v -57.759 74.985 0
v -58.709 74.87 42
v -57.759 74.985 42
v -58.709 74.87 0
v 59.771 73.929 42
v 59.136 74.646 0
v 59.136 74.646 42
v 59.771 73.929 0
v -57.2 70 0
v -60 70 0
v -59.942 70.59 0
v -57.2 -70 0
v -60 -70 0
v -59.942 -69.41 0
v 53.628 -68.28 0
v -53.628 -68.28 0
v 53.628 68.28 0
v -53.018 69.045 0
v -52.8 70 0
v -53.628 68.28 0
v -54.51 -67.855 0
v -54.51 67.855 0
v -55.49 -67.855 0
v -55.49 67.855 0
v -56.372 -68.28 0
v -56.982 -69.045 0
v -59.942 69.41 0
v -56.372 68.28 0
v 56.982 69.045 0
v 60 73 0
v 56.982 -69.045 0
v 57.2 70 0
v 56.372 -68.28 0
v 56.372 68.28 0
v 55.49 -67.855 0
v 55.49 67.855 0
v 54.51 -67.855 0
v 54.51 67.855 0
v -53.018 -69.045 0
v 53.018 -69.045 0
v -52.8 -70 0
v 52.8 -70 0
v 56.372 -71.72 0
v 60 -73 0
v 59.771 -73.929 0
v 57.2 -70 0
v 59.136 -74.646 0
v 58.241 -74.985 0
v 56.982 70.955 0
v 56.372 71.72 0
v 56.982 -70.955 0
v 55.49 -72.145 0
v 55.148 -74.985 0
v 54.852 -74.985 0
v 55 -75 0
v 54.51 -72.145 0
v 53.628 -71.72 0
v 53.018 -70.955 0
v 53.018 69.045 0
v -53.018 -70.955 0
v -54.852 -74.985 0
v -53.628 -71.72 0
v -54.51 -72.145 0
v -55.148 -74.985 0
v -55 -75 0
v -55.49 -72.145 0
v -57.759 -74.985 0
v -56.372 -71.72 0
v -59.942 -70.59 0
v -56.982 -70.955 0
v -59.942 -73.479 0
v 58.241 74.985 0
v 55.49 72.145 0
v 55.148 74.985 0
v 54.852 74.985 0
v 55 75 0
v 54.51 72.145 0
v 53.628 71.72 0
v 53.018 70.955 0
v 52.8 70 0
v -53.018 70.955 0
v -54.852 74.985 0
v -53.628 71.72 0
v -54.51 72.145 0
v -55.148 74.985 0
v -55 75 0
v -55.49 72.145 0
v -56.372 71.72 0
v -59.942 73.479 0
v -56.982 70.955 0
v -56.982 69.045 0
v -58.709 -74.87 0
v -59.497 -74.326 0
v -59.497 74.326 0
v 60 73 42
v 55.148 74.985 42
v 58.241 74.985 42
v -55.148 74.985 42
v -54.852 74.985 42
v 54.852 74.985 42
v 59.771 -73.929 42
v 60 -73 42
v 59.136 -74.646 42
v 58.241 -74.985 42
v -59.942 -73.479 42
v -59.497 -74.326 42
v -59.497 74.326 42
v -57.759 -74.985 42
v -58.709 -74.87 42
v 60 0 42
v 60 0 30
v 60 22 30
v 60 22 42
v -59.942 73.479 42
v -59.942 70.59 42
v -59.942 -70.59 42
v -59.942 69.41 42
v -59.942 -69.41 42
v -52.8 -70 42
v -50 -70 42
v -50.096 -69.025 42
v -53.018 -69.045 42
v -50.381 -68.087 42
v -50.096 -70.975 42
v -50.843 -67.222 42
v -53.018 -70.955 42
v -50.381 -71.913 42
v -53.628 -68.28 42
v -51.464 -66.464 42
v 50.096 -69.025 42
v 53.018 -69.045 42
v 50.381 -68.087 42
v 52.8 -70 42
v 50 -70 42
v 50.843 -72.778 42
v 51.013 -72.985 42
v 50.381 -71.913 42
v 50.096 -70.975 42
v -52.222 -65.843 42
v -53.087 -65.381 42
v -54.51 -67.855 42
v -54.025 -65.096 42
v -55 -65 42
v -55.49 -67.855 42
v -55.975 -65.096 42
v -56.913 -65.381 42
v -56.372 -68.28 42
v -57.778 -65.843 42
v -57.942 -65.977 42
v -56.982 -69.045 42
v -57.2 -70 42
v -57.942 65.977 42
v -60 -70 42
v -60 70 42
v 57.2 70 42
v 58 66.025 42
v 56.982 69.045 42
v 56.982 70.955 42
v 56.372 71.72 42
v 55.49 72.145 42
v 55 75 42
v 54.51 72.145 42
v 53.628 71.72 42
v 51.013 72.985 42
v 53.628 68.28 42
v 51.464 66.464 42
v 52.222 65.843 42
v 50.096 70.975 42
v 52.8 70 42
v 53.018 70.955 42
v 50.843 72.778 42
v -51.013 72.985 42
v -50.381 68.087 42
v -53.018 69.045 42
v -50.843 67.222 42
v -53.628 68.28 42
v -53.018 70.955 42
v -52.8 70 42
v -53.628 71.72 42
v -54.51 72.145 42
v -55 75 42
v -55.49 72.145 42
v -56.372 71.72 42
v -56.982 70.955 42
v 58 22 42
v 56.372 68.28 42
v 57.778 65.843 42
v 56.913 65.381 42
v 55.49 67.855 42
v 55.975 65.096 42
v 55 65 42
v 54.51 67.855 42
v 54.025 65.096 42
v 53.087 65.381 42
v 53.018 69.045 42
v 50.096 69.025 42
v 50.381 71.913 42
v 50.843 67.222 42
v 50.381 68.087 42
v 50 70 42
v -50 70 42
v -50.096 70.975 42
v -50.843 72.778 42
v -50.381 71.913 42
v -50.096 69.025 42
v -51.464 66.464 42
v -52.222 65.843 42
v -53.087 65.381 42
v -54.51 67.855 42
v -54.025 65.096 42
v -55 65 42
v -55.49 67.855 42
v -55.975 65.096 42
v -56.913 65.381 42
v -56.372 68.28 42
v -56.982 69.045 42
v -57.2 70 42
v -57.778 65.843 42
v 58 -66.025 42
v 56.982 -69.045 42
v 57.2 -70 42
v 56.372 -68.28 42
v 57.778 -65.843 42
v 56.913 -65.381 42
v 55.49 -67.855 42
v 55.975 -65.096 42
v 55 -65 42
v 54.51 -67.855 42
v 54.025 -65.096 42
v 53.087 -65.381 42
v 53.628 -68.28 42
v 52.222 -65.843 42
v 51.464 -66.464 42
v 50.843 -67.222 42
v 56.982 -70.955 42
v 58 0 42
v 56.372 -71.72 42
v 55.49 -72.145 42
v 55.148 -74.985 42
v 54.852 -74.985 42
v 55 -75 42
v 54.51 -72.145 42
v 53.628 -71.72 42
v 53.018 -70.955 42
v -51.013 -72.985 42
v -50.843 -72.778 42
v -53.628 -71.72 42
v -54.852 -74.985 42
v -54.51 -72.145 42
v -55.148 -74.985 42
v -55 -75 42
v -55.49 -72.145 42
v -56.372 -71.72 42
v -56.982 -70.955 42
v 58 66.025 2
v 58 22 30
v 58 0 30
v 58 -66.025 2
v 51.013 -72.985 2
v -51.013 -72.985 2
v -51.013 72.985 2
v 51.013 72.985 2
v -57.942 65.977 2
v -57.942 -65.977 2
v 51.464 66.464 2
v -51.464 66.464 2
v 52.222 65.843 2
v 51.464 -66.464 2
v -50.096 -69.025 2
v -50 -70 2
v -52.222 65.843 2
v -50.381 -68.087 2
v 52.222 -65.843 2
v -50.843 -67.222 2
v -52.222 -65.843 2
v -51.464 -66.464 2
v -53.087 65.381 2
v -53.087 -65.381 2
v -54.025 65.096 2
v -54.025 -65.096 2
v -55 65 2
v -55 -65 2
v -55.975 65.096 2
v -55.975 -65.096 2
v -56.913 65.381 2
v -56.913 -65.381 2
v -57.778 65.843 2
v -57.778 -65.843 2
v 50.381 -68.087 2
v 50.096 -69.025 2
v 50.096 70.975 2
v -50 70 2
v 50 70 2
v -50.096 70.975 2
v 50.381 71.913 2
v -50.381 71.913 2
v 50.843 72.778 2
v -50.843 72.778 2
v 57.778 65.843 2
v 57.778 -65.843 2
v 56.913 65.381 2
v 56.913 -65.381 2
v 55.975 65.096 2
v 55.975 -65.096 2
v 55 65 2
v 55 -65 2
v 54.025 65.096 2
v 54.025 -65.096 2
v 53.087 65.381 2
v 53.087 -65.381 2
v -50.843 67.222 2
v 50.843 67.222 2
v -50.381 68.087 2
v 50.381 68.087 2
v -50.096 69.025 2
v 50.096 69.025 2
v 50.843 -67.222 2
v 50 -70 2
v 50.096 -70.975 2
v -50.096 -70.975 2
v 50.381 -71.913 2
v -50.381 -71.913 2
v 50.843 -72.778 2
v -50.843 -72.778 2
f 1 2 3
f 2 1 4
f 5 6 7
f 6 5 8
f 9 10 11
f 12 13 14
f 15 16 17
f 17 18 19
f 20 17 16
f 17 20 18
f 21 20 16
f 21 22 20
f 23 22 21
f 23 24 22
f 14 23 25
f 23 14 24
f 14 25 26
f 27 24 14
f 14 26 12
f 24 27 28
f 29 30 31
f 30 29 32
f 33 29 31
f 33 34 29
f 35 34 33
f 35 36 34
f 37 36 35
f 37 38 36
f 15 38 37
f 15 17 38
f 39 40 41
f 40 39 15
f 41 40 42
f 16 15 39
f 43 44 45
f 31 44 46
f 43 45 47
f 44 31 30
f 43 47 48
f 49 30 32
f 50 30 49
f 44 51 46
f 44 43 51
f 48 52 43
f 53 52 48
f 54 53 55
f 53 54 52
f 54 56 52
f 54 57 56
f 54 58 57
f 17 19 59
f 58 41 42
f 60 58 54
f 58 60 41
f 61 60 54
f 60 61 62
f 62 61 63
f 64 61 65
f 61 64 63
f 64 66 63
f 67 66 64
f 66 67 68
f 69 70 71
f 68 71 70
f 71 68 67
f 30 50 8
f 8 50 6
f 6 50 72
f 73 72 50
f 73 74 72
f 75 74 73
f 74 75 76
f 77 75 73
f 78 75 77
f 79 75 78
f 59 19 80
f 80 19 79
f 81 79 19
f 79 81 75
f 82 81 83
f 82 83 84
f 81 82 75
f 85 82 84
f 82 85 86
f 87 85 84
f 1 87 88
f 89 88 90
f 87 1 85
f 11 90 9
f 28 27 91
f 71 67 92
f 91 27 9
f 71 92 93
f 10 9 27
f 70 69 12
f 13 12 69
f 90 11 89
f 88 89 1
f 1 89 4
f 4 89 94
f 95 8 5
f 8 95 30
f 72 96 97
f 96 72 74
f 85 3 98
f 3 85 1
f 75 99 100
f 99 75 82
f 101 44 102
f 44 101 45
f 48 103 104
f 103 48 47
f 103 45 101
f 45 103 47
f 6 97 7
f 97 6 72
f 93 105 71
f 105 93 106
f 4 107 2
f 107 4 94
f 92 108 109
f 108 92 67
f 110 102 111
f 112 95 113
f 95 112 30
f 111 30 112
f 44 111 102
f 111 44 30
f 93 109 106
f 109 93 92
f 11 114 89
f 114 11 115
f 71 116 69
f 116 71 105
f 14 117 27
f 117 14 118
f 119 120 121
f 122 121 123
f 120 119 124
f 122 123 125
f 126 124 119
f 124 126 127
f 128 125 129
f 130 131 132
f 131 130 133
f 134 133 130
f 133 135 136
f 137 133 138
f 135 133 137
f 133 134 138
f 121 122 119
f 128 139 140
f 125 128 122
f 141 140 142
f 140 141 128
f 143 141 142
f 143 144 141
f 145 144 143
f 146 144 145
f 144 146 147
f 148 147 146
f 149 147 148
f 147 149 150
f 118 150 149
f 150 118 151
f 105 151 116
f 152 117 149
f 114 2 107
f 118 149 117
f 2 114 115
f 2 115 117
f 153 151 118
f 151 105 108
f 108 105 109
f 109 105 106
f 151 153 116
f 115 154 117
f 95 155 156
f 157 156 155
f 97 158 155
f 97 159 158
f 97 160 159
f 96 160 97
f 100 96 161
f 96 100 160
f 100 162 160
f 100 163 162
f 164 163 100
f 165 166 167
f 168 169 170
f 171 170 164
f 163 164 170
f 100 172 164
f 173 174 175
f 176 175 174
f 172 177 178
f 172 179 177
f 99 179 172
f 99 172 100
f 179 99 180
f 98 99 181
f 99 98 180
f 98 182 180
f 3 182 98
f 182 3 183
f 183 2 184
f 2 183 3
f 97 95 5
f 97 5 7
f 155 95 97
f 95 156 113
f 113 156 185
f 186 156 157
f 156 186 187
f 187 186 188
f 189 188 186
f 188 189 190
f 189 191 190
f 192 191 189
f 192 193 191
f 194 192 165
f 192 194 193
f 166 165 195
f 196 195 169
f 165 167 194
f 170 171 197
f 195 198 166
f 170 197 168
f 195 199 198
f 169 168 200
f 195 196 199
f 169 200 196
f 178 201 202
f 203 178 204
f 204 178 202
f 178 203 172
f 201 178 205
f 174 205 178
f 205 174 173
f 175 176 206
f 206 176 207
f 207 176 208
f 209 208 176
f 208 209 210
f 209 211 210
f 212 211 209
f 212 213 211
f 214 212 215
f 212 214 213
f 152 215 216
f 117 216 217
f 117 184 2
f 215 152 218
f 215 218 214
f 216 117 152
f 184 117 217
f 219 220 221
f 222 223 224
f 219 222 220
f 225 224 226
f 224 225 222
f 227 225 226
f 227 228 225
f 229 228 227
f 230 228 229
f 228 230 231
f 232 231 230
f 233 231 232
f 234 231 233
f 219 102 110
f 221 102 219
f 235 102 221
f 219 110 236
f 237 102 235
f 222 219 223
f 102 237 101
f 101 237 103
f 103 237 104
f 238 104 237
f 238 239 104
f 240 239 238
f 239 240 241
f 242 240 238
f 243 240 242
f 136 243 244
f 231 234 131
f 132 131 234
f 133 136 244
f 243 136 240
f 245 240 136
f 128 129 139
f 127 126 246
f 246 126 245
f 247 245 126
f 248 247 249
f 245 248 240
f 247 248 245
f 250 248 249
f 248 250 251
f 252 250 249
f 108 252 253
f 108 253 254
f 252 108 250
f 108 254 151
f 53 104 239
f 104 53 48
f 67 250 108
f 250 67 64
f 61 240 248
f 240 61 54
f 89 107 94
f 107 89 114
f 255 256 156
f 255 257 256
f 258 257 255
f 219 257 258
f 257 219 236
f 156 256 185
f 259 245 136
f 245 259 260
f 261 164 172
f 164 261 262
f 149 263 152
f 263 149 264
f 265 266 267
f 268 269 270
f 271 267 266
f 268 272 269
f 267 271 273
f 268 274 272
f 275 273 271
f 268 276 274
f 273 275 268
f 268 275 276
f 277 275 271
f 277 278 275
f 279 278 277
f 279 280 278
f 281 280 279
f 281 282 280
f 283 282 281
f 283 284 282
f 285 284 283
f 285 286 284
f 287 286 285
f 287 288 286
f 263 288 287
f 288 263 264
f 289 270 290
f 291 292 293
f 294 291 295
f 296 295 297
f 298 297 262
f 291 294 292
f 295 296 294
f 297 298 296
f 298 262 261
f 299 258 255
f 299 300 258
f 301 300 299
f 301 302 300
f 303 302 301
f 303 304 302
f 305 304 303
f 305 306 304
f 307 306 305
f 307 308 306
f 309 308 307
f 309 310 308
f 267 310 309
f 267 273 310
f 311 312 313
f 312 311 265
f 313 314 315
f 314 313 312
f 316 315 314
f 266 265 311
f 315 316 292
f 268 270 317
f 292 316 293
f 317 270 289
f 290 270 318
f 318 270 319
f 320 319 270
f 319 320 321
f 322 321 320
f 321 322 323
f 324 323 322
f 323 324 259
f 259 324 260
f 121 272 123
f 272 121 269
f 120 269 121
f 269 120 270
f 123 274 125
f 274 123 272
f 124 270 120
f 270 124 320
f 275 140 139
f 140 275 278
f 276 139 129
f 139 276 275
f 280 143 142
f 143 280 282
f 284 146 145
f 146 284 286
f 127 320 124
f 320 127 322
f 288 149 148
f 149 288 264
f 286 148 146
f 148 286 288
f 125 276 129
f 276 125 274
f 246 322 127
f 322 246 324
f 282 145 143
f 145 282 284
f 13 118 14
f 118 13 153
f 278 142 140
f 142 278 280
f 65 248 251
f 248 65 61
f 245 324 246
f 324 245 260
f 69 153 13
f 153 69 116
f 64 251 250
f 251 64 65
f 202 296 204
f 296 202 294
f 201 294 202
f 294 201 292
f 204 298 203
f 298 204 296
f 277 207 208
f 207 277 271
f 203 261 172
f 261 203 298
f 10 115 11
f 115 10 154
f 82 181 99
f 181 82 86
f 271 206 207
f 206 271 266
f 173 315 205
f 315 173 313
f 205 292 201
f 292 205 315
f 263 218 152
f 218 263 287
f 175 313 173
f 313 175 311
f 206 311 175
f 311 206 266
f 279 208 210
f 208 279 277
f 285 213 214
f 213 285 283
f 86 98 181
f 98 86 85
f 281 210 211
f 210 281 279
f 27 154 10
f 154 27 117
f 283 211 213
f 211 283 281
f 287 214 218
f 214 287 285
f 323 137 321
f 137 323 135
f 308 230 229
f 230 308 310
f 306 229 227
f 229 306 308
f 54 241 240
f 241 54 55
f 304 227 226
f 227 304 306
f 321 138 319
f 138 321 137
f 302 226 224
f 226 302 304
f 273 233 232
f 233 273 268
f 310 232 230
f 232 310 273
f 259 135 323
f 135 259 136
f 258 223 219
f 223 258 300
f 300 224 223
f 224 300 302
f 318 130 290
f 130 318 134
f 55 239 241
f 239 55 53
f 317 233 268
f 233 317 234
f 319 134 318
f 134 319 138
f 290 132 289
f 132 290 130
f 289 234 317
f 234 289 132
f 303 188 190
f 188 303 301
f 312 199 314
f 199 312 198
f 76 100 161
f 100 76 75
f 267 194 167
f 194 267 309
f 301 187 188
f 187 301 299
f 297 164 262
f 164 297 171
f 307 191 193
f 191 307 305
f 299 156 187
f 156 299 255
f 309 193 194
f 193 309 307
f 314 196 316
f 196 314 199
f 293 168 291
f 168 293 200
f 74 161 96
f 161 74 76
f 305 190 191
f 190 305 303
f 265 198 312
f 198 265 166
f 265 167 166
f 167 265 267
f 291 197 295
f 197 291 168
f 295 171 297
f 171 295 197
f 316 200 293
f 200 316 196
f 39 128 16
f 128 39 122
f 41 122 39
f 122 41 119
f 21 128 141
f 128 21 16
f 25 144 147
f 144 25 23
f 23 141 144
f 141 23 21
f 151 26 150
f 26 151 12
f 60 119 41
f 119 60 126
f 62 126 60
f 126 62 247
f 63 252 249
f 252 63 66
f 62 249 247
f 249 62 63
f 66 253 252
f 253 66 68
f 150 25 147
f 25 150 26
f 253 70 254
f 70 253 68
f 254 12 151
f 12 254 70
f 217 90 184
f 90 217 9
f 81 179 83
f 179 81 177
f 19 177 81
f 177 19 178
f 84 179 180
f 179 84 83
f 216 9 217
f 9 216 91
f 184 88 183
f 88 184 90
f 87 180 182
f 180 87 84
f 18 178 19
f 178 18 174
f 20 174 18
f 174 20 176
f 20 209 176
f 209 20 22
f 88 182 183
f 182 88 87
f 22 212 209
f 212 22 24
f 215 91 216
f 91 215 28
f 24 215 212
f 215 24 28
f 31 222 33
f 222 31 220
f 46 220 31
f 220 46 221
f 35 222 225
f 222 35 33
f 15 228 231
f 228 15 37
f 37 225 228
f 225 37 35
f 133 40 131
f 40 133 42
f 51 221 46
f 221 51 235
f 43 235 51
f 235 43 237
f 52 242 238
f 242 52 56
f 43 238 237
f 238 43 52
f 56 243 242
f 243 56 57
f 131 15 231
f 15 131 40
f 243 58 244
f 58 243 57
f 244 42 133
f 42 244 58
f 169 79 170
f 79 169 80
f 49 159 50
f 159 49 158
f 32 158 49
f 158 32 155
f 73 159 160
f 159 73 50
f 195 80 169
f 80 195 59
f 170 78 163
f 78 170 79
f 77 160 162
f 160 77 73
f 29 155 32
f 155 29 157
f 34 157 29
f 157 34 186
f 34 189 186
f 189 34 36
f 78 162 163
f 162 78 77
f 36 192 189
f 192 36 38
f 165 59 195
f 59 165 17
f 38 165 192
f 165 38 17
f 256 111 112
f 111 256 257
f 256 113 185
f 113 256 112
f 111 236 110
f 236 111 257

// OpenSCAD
$fs=$fs/2;
$fa=$fa/2;

include <config.scad>


l = 120;
lg= 150;
e = 2;
h = 42;


module boitier_sup(){
    difference(){
        cube_arrondi(l, lg, e);
        for(i = [-1,1]){
            for(j = [-1,1]){
                translate([i*(l/2-5), j*(lg/2-5), -1]) cylinder(r=2.2, 10);
            }
        }
        
    }
}

module boitier_inf(){
    difference(){
        union(){
            difference(){
                cube_arrondi(l, lg, h);
                translate([0,0, e])cube_arrondi(l-2*e, lg-2*e, h);
                
            }
            for(i = [-1,1]){
                for(j = [-1,1]){
                    translate([i*(l/2-5), j*(lg/2-5), 0]) cylinder(r=5, h);
                }
            }
        }
        for(i = [-1,1]){
            for(j = [-1,1]){
                translate([i*(l/2-5), j*(lg/2-5), -1]) cylinder(r=2.2, h+2);
            }
        }
        translate([0,0, h-12])cube([100, 22, 12]);
    }
}

boitier_inf();
